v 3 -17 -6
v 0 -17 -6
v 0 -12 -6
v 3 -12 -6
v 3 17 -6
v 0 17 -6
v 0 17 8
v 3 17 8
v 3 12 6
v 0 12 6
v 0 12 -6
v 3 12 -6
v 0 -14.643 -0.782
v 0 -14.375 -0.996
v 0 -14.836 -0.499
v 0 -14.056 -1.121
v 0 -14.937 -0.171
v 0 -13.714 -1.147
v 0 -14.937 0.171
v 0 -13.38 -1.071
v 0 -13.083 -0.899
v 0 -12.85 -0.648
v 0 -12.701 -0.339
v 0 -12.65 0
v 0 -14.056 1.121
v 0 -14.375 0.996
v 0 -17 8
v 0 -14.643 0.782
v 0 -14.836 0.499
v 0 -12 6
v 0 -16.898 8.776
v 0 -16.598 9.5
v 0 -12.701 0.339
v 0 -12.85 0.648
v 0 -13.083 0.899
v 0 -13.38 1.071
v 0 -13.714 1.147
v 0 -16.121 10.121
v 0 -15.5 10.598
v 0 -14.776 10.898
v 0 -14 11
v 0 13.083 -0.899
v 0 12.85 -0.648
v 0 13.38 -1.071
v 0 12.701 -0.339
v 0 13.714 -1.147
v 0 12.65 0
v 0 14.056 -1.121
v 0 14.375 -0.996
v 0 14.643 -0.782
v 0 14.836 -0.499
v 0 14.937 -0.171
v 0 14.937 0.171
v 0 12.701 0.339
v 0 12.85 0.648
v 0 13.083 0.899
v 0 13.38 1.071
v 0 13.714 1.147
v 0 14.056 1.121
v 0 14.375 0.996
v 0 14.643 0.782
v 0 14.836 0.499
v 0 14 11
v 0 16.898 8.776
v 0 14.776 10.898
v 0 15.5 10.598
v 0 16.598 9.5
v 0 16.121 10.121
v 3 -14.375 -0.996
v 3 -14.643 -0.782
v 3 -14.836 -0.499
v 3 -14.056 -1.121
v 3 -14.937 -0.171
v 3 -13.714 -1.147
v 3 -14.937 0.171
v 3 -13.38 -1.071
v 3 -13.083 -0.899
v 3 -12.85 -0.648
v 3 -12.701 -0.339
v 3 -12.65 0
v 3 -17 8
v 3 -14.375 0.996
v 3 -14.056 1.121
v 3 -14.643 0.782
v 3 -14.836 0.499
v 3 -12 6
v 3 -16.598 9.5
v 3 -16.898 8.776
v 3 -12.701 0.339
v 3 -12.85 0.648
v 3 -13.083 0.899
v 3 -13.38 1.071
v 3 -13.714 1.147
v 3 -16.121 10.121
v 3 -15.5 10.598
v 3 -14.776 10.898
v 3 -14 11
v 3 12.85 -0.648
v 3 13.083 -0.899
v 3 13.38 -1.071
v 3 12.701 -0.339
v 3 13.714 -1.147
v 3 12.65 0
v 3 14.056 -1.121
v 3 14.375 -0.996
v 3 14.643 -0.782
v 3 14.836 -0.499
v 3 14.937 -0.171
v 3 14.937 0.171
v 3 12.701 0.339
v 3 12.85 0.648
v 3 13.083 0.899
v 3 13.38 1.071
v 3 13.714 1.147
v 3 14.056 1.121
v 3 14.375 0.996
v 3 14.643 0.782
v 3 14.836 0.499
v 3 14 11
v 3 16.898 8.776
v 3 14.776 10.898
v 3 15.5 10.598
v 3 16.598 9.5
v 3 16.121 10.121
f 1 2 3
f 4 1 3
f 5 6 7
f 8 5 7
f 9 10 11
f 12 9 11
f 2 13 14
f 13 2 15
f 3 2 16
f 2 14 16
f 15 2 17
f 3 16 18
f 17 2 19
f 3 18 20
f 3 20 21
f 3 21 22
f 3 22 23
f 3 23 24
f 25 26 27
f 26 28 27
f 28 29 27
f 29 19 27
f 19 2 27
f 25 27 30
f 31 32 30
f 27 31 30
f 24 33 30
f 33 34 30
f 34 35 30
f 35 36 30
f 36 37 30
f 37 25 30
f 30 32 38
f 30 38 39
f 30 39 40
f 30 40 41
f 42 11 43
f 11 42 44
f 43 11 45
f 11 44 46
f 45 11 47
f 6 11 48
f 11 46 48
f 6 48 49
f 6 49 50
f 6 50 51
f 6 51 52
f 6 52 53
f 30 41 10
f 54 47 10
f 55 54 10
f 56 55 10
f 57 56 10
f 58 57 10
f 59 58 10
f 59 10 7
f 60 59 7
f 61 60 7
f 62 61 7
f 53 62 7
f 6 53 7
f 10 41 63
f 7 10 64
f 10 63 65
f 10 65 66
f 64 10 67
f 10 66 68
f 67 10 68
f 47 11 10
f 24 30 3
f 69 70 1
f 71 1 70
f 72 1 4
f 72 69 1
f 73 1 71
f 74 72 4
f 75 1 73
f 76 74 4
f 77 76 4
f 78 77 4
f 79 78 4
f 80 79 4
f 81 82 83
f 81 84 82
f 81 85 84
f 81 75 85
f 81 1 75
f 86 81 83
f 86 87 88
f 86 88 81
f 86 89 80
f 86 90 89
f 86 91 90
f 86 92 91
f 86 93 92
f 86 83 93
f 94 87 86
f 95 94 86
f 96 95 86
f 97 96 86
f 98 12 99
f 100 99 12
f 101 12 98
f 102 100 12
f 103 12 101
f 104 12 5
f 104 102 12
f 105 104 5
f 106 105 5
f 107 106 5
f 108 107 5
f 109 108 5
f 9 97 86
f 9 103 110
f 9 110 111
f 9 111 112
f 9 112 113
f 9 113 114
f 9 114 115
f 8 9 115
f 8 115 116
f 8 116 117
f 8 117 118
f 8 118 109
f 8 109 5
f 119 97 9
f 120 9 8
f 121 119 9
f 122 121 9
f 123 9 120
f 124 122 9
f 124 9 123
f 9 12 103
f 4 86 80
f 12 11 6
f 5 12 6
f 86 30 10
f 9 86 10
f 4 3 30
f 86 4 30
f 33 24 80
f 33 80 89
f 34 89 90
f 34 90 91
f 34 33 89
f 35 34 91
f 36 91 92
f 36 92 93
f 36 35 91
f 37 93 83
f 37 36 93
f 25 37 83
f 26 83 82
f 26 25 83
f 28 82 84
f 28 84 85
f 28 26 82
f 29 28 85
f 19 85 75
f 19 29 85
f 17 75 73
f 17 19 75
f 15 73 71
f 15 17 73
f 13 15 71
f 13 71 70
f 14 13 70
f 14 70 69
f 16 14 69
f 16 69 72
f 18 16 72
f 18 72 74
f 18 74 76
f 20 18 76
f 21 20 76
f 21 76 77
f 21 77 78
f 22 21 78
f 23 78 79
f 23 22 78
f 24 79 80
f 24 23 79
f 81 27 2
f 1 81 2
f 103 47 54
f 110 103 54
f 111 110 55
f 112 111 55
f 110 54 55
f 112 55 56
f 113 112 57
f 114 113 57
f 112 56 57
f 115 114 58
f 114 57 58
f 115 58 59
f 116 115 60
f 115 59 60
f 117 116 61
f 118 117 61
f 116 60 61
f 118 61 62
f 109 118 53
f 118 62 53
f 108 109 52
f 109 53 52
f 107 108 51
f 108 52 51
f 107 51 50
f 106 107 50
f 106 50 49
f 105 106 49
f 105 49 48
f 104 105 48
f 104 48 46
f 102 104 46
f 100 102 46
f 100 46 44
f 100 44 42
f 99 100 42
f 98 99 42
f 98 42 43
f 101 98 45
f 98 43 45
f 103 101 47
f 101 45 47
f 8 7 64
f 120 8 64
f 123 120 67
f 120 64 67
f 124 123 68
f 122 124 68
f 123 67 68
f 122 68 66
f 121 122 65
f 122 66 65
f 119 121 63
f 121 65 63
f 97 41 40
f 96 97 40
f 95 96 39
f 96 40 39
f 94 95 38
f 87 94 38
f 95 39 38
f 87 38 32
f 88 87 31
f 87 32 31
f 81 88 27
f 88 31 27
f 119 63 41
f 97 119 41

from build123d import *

# Parameters (mm, degrees)
F0_R     = 1.15
F1_DEPTH = 3


with BuildPart() as f1:
    # F0 (on Right) → F1 (new body)
    with BuildSketch(Plane.YZ):
        with BuildLine():
            Line((-12, 0), (-12, 6))
            Line((-12, 6), (12, 6))
            Line((12, 6), (12, 0))
            Line((12, 0), (12, -6))
            Line((12, -6), (17, -6))
            Line((17, -6), (17, 8))
            ThreePointArc((17, 8), (16.12132, 10.12132), (14, 11))
            Line((14, 11), (0, 11))
            Line((0, 11), (-14, 11))
            ThreePointArc((-14, 11), (-16.12132, 10.12132), (-17, 8))
            Line((-17, 8), (-17, -6))
            Line((-17, -6), (-12, -6))
            Line((-12, -6), (-12, 0))
        make_face()
        with Locations((-13.8, 0)):
            Circle(F0_R, mode=Mode.SUBTRACT)
        with BuildLine():
            ThreePointArc((14.95, 0), (13.8, -1.15), (12.65, 0))
            ThreePointArc((12.65, 0), (13.8, 1.15), (14.95, 0))
        make_face(mode=Mode.SUBTRACT)
    extrude(amount=F1_DEPTH)


solid = f1.part
